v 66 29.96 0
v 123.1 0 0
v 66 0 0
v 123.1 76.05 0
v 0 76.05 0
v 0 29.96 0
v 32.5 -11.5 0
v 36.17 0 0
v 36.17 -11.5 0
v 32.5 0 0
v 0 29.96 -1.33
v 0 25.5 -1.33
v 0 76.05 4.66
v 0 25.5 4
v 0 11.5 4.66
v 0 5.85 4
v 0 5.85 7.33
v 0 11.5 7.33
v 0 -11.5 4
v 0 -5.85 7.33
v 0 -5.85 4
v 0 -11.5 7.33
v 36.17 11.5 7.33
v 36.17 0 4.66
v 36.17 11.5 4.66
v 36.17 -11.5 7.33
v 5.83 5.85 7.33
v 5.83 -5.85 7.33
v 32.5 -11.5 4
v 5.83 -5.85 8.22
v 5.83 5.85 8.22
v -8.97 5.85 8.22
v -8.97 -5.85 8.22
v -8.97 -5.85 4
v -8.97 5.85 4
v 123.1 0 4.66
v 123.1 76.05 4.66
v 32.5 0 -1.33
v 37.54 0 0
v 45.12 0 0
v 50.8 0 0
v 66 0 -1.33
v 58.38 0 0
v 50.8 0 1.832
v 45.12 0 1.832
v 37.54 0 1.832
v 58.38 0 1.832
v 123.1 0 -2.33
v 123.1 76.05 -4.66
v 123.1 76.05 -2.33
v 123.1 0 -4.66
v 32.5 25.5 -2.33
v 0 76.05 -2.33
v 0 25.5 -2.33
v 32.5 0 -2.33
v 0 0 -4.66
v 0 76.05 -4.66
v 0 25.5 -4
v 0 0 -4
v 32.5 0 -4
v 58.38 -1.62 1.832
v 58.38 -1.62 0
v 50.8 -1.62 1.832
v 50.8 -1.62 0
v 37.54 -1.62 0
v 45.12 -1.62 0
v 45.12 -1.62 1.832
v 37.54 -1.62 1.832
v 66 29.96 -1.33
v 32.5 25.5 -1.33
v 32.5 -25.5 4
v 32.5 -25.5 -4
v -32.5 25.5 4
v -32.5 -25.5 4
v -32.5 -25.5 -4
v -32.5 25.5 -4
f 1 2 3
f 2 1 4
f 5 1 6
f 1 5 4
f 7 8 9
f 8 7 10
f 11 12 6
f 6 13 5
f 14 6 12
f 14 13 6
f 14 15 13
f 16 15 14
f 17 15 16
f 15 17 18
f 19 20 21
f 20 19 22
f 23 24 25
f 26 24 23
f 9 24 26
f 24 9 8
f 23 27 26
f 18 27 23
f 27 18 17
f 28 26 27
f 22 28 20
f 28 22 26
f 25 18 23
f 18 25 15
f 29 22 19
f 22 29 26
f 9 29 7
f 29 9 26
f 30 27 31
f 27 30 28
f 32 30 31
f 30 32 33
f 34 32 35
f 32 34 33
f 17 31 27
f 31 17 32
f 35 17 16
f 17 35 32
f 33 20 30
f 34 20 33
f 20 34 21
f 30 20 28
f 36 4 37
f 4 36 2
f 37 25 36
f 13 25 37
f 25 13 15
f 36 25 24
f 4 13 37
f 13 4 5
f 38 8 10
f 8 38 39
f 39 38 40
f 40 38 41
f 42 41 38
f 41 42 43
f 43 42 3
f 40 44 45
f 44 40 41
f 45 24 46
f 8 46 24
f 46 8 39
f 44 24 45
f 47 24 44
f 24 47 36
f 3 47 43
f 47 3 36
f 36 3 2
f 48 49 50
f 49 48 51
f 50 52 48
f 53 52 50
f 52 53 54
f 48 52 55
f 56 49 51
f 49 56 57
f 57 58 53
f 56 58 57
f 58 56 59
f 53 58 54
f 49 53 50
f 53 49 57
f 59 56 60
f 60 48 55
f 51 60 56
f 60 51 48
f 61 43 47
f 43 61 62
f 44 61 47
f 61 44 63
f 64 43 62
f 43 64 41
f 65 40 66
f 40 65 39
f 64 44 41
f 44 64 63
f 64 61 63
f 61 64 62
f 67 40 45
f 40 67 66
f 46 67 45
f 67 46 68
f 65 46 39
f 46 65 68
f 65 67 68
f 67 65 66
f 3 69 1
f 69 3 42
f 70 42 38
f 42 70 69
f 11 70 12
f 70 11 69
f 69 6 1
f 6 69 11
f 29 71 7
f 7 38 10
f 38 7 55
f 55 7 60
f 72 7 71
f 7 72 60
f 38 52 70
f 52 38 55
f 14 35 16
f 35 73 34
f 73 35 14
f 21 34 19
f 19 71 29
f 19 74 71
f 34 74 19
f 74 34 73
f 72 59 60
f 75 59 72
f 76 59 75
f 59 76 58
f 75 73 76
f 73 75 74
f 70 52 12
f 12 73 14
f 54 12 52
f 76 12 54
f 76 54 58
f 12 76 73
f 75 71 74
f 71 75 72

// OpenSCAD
intersection() {
	union() {
		union() {
			union() {
				union() {
					union() {
						union() {
							union() {
								union() {
									translate(v = [0, 0, 0]) {
										color(c = [0, 0, 1]) {
											cube(size = [15.2500000000, 24.3400000000, 3]);
										}
									}
									translate(v = [0, 0, 0]) {
										union() {
											color(c = [0, 0.5000000000, 0]) {
												translate(v = [0, 0, -2.3000000000]) {
													translate(v = [-9.9950000000, 0, 0]) {
														translate(v = [0, -11.9950000000, 0]) {
															cube(size = [23.9900000000, 23.9900000000, 2.3000000000]);
														}
													}
												}
											}
											color(c = [0, 0, 0]) {
												translate(v = [-4.2000000000, -4.2000000000, 0]) {
													cube(size = [8.4000000000, 8.4000000000, 2.3000000000]);
												}
												translate(v = [0, 0, 2.3000000000]) {
													cylinder(h = 2.3000000000, r1 = 4.0000000000, r2 = 4.0000000000);
												}
											}
										}
									}
								}
								translate(v = [0, 0, 0]) {
									union() {
										color(c = [0, 0.5000000000, 0]) {
											translate(v = [0, -11.5000000000, 0]) {
												cube(size = [36.1700000000, 23.0000000000, 7.3300000000]);
											}
										}
										color(c = [0.8240000000, 0.8240000000, 0.8240000000]) {
											translate(v = [-8.9700000000, 0, 0]) {
												translate(v = [0, 0, 2.3300000000]) {
													translate(v = [0, -5.8500000000, 0]) {
														cube(size = [14.8000000000, 11.7000000000, 5.8900000000]);
													}
												}
											}
										}
									}
								}
							}
							translate(v = [0, 0, 0]) {
								color(c = [0.7000000000, 0.7000000000, 0.7000000000]) {
									cube(center = true, size = [21.6200000000, 18.0000000000, 7.7700000000]);
								}
							}
						}
						translate(v = [0, 0, 0]) {
							union() {
								color(c = [0.5000000000, 0.5000000000, 0]) {
									cube(size = [123.1000000000, 76.0500000000, 4.6600000000]);
								}
								color(c = [0.8240000000, 0.8240000000, 0.8240000000]) {
									translate(v = [0, 0, -4.6600000000]) {
										cube(size = [123.1000000000, 76.0500000000, 2.3300000000]);
									}
								}
							}
						}
					}
					translate(v = [0, 0, 0]) {
						color(c = [0, 0, 1]) {
							cube(center = true, size = [48.0000000000, 40.7500000000, 5.6900000000]);
						}
					}
				}
				translate(v = [0, 0, 0]) {
					union() {
						union() {
							translate(v = [0, -1.6200000000, 0]) {
								translate(v = [37.5400000000, 0, 0]) {
									union() {
										translate(v = [13.2600000000, 0, 0]) {
											color(c = [0.8240000000, 0.8240000000, 0.8240000000]) {
												cube(size = [7.5800000000, 5.5500000000, 1.8325000000]);
											}
										}
										color(c = [0.8240000000, 0.8240000000, 0.8240000000]) {
											cube(size = [7.5800000000, 5.5500000000, 1.8325000000]);
										}
									}
								}
							}
							translate(v = [0, -1.6200000000, 0]) {
								translate(v = [8.0400000000, 0, 0]) {
									color(c = [0.8240000000, 0.8240000000, 0.8240000000]) {
										cube(size = [11.2400000000, 7.5800000000, 1.8325000000]);
									}
								}
							}
						}
						color(c = [0, 0.5000000000, 0]) {
							translate(v = [0, 0, -1.3300000000]) {
								cube(size = [66.0000000000, 29.9600000000, 1.3300000000]);
							}
						}
					}
				}
			}
			translate(v = [0, 0, 0]) {
				color(c = [0.9500000000, 0.9500000000, 0.9500000000]) {
					cube(center = true, size = [65.0000000000, 51.0000000000, 8.0000000000]);
				}
			}
		}
		translate(v = [0, 0, 0]) {
			color(c = [0.1000000000, 0.1000000000, 0.1000000000]) {
				cube(center = true, size = [45.6200000000, 34.0000000000, 8.0000000000]);
			}
		}
	}
	union() {
		union() {
			union() {
				union() {
					union() {
						union() {
							union() {
								union() {
									translate(v = [0, 0, 0]) {
										color(c = [0, 0, 1]) {
											cube(size = [15.2500000000, 24.3400000000, 3]);
										}
									}
									translate(v = [0, 0, 0]) {
										union() {
											color(c = [0, 0.5000000000, 0]) {
												translate(v = [0, 0, -2.3000000000]) {
													translate(v = [-9.9950000000, 0, 0]) {
														translate(v = [0, -11.9950000000, 0]) {
															cube(size = [23.9900000000, 23.9900000000, 2.3000000000]);
														}
													}
												}
											}
											color(c = [0, 0, 0]) {
												translate(v = [-4.2000000000, -4.2000000000, 0]) {
													cube(size = [8.4000000000, 8.4000000000, 2.3000000000]);
												}
												translate(v = [0, 0, 2.3000000000]) {
													cylinder(h = 2.3000000000, r1 = 4.0000000000, r2 = 4.0000000000);
												}
											}
										}
									}
								}
								translate(v = [0, 0, 0]) {
									union() {
										color(c = [0, 0.5000000000, 0]) {
											translate(v = [0, -11.5000000000, 0]) {
												cube(size = [36.1700000000, 23.0000000000, 7.3300000000]);
											}
										}
										color(c = [0.8240000000, 0.8240000000, 0.8240000000]) {
											translate(v = [-8.9700000000, 0, 0]) {
												translate(v = [0, 0, 2.3300000000]) {
													translate(v = [0, -5.8500000000, 0]) {
														cube(size = [14.8000000000, 11.7000000000, 5.8900000000]);
													}
												}
											}
										}
									}
								}
							}
							translate(v = [0, 0, 0]) {
								color(c = [0.7000000000, 0.7000000000, 0.7000000000]) {
									cube(center = true, size = [21.6200000000, 18.0000000000, 7.7700000000]);
								}
							}
						}
						translate(v = [0, 0, 0]) {
							union() {
								color(c = [0.5000000000, 0.5000000000, 0]) {
									cube(size = [123.1000000000, 76.0500000000, 4.6600000000]);
								}
								color(c = [0.8240000000, 0.8240000000, 0.8240000000]) {
									translate(v = [0, 0, -4.6600000000]) {
										cube(size = [123.1000000000, 76.0500000000, 2.3300000000]);
									}
								}
							}
						}
					}
					translate(v = [0, 0, 0]) {
						color(c = [0, 0, 1]) {
							cube(center = true, size = [48.0000000000, 40.7500000000, 5.6900000000]);
						}
					}
				}
				translate(v = [0, 0, 0]) {
					union() {
						union() {
							translate(v = [0, -1.6200000000, 0]) {
								translate(v = [37.5400000000, 0, 0]) {
									union() {
										translate(v = [13.2600000000, 0, 0]) {
											color(c = [0.8240000000, 0.8240000000, 0.8240000000]) {
												cube(size = [7.5800000000, 5.5500000000, 1.8325000000]);
											}
										}
										color(c = [0.8240000000, 0.8240000000, 0.8240000000]) {
											cube(size = [7.5800000000, 5.5500000000, 1.8325000000]);
										}
									}
								}
							}
							translate(v = [0, -1.6200000000, 0]) {
								translate(v = [8.0400000000, 0, 0]) {
									color(c = [0.8240000000, 0.8240000000, 0.8240000000]) {
										cube(size = [11.2400000000, 7.5800000000, 1.8325000000]);
									}
								}
							}
						}
						color(c = [0, 0.5000000000, 0]) {
							translate(v = [0, 0, -1.3300000000]) {
								cube(size = [66.0000000000, 29.9600000000, 1.3300000000]);
							}
						}
					}
				}
			}
			translate(v = [0, 0, 0]) {
				color(c = [0.9500000000, 0.9500000000, 0.9500000000]) {
					cube(center = true, size = [65.0000000000, 51.0000000000, 8.0000000000]);
				}
			}
		}
		translate(v = [0, 0, 0]) {
			color(c = [0.1000000000, 0.1000000000, 0.1000000000]) {
				cube(center = true, size = [45.6200000000, 34.0000000000, 8.0000000000]);
			}
		}
	}
}
/***********************************************
*********      SolidPython code:      **********
************************************************
 
from __future__ import division
import os
import sys
import re
import subprocess

# Assumes SolidPython is in site-packages or elsewhwere in sys.path
from solid import *
from solid.utils import *

SEGMENTS = 48

to_be_rendered = right(10000000000)(cube(3))        # A shitty version of a null object. OpenSCAD get your shit together

def audioAmp(pos):
  if pos is None:
    pos = [0,0,0]
  audioAmp = color(Blue)(                         
                        cube([15.25,24.34,3])    
                        )
  return translate(pos)(audioAmp)
def camera(pos):

  if pos is None:
    pos = [0,0,0]
  rp_width = 23.99
  rp_length = 23.99
  rp_height = 2.3
  rectangularPlate = color([0,0.5,0])(                        
                                 down(rp_height)(left(rp_length/2-2)(back(rp_width/2)(cube([rp_length,rp_width,rp_height]))))
                                 )
  se_length = 8.4
  se_height = 2.3
  cameraBody = color(Black)(                        
                           translate([-se_length/2,-se_length/2,0])(cube([se_length,se_length,2.3])),
                           up(se_height)(cylinder(h = 2.3, r1 = 4.0, r2 = 4.0))     
                           )
  camera = rectangularPlate + cameraBody
  return translate(pos)(camera)
def powerBoost(pos):

  if pos is None:
    pos = [0,0,0]
  rp_length = 36.17
  rp_width = 23.00
  rp_height = 2.33
  odd_component_height = 7.33
  rectangularPlate = color([0,0.5,0])(                        
                                 back(rp_width/2)(cube([rp_length,rp_width,odd_component_height]))
                                 )
  usb_width = 11.7
  usb_length = 14.8
  usb_height = 5.89
  usbPort = color([0.824,0.824,0.824])(
                                     left(8.97)(up(rp_height)(back(usb_width/2)(cube([usb_length,usb_width,usb_height]))))
                                      )
  powerBoost = rectangularPlate + usbPort
  return translate(pos)(powerBoost)
def speaker(pos):

  if pos is None:
    pos = [0,0,0]
  length = 21.62
  width = 18.00
  height = 7.77
  speaker = color([0.7,0.7,0.7])(                        
                                cube([length,width,height],center = True)
                                )

  return translate(pos)(speaker)
def screen(pos):

  if pos is None:
    pos = [0,0,0]
  lcd_length = 123.10
  lcd_width = 76.05
  lcd_height = 2.33 * 2      # guesstimate
  screenLCD = color([0.5,0.5,0])(                        
                                cube([lcd_length,lcd_width,lcd_height])
                                )
  plate_length = 123.10
  plate_width = 76.05
  plate_height = 2.33
  circuitPlate = color([0.824,0.824,0.824])(
                                           down(plate_height*2)(cube([plate_length,plate_width,plate_height]))
                                           )
  powerBoost = screenLCD + circuitPlate
  return translate(pos)(powerBoost)
def screenDriver(pos):

  if pos is None:
    pos = [0,0,0]
  length = 48.00
  width = 40.75
  height = 5.69
  screenDriver = color(Blue)(                        
                                cube([length,width,height],center = True)
                                )

  return translate(pos)(screenDriver)
def piZero(pos):

  if pos is None:
    pos = [0,0,0]
  rp_length = 66.00
  rp_width = 29.96
  rp_height = 1.33
  rectangularPlate = color([0,0.5,0])(                        
                                     down(rp_height)(cube([rp_length,rp_width,rp_height]))
                                     )
  usb1_width = 5.55
  usb1_length = 7.58
  usb1_height = 7.33/4
  usbPortTemplate1 = color([0.824,0.824,0.824])(
                                               cube([usb1_length,usb1_width,usb1_height])
                                               )
  
  usbPort1 = back(31.58-29.96)(right(37.54)(right(50.8 - 37.54)(usbPortTemplate1) + usbPortTemplate1))
  
  usb2_length = 11.24
  usb2_width = 7.58
  usb2_height = 7.33/4
  usbPortTemplate2 = color([0.824,0.824,0.824])(
                                               cube([usb2_length,usb2_width,usb2_height])
                                               )
  usbPort2 = back(31.58-29.96)(right(8.04)(usbPortTemplate2))
  
  usbPort = usbPort1 + usbPort2
  piZero = usbPort + rectangularPlate
  return translate(pos)(piZero)
def battery(pos):

  if pos is None:
    pos = [0,0,0]
  length = 65.00
  width = 51.00
  height = 8.00
  battery = color([0.95,0.95,0.95])(                        
                                   cube([length,width,height],center = True)
                                   )

  return translate(pos)(battery)
def gsmChip(pos):

  if pos is None:
    pos = [0,0,0]
  length = 45.62
  width = 34.00
  height = 8.00
  gsmChip = color([0.1,0.1,0.1])(                        
                                cube([length,width,height],center = True)
                                )

  return translate(pos)(gsmChip)

pos = [0,0,0]



body  = audioAmp(pos)
body += camera(pos)
body += powerBoost(pos)
body += speaker(pos)
body += screen(pos)
body += screenDriver(pos)
body += piZero(pos)
body += battery(pos)
body += gsmChip(pos)

def audioAmp(pos):
  if pos is None:
    pos = [0,0,0]
  audioAmp = color(Blue)(                         
                        cube([15.25,24.34,3])    
                        )
  return translate(pos)(audioAmp)

def boundingBox(openscadObject):

  def isanumber(a):

    try:
        float(a)
        bool_a = True
    except:
        bool_a = False

    return bool_a

  # Create space for an openscad file
  cwd = os.getcwd()
  code_filepath = os.path.join(cwd, "tempOpenSCADfile.scad")
  stl_filepath  = os.path.join(cwd, "tempOpenSCADfile.stl")
  # Convert object to valid openSCAD code
  code = scad_render_to_file(openscadObject,code_filepath)

  # Ask openSCAD to generate STL
  subprocess.call(["openscad","-o",stl_filepath,code_filepath])

  # Time to use admesh to find min/max values
  cmd = ['admesh',stl_filepath]
  proc = subprocess.Popen('admesh tempOpenSCADfile.stl',shell=True,stdout=subprocess.PIPE)

  for line in proc.stdout:
    if 'Min X' in line.decode("utf-8"):
      my_list = line.decode("utf-8").split()
      [minX,maxX] = [float(x.replace(",", "")) for x in my_list if isanumber(x.replace(",", "")) == True]

    if 'Min Y' in line.decode("utf-8"):
      my_list = line.decode("utf-8").split()
      [minY,maxY] = [float(x.replace(",", "")) for x in my_list if isanumber(x.replace(",", "")) == True]

    if 'Min Z' in line.decode("utf-8"):
      my_list = line.decode("utf-8").split()
      [minZ,maxZ] = [float(x.replace(",", "")) for x in my_list if isanumber(x.replace(",", "")) == True]

  return [minX,maxX,minY,maxY,minZ,maxZ]
      

#  for line in proc.stdout.readlines():
#    if "minX" in line:
#      print(line)

def intersectionAssertion(object1,object2):

  def isanumber(a):

    try:
        float(a)
        bool_a = True
    except:
        bool_a = False

    return bool_a

  openscadObject = object1 * object2

  # Create space for an openscad file
  cwd = os.getcwd()
  code_filepath = os.path.join(cwd, "tempOpenSCADfile_intersection.scad")
  png_filepath  = os.path.join(cwd, "tempOpenSCADfile_intersection.png")
  # Convert object to valid openSCAD code
  code = scad_render_to_file(openscadObject,code_filepath)

  # Ask openSCAD to generate STL
  subprocess.call(["openscad","-o",png_filepath,code_filepath])

  # Time to use admesh to find min/max values
  cmd = 'magick ' + png_filepath + ' -define histogram:unique-colors=true -format %c histogram:info:- | wc -l'
  proc = subprocess.Popen(cmd,shell=True,stdout=subprocess.PIPE)

  for line in proc.stdout:
    ans = isanumber(line.decode("utf-8"))

  if ans is True:
    return True
  else:
    return False

if __name__ == '__main__':
    a = body
    print(intersectionAssertion(a,a))
    print(boundingBox(a))
#    scad_render_to_file(a, file_header='$fn = %s;' % SEGMENTS, include_orig_code=False)
 
 
************************************************/
